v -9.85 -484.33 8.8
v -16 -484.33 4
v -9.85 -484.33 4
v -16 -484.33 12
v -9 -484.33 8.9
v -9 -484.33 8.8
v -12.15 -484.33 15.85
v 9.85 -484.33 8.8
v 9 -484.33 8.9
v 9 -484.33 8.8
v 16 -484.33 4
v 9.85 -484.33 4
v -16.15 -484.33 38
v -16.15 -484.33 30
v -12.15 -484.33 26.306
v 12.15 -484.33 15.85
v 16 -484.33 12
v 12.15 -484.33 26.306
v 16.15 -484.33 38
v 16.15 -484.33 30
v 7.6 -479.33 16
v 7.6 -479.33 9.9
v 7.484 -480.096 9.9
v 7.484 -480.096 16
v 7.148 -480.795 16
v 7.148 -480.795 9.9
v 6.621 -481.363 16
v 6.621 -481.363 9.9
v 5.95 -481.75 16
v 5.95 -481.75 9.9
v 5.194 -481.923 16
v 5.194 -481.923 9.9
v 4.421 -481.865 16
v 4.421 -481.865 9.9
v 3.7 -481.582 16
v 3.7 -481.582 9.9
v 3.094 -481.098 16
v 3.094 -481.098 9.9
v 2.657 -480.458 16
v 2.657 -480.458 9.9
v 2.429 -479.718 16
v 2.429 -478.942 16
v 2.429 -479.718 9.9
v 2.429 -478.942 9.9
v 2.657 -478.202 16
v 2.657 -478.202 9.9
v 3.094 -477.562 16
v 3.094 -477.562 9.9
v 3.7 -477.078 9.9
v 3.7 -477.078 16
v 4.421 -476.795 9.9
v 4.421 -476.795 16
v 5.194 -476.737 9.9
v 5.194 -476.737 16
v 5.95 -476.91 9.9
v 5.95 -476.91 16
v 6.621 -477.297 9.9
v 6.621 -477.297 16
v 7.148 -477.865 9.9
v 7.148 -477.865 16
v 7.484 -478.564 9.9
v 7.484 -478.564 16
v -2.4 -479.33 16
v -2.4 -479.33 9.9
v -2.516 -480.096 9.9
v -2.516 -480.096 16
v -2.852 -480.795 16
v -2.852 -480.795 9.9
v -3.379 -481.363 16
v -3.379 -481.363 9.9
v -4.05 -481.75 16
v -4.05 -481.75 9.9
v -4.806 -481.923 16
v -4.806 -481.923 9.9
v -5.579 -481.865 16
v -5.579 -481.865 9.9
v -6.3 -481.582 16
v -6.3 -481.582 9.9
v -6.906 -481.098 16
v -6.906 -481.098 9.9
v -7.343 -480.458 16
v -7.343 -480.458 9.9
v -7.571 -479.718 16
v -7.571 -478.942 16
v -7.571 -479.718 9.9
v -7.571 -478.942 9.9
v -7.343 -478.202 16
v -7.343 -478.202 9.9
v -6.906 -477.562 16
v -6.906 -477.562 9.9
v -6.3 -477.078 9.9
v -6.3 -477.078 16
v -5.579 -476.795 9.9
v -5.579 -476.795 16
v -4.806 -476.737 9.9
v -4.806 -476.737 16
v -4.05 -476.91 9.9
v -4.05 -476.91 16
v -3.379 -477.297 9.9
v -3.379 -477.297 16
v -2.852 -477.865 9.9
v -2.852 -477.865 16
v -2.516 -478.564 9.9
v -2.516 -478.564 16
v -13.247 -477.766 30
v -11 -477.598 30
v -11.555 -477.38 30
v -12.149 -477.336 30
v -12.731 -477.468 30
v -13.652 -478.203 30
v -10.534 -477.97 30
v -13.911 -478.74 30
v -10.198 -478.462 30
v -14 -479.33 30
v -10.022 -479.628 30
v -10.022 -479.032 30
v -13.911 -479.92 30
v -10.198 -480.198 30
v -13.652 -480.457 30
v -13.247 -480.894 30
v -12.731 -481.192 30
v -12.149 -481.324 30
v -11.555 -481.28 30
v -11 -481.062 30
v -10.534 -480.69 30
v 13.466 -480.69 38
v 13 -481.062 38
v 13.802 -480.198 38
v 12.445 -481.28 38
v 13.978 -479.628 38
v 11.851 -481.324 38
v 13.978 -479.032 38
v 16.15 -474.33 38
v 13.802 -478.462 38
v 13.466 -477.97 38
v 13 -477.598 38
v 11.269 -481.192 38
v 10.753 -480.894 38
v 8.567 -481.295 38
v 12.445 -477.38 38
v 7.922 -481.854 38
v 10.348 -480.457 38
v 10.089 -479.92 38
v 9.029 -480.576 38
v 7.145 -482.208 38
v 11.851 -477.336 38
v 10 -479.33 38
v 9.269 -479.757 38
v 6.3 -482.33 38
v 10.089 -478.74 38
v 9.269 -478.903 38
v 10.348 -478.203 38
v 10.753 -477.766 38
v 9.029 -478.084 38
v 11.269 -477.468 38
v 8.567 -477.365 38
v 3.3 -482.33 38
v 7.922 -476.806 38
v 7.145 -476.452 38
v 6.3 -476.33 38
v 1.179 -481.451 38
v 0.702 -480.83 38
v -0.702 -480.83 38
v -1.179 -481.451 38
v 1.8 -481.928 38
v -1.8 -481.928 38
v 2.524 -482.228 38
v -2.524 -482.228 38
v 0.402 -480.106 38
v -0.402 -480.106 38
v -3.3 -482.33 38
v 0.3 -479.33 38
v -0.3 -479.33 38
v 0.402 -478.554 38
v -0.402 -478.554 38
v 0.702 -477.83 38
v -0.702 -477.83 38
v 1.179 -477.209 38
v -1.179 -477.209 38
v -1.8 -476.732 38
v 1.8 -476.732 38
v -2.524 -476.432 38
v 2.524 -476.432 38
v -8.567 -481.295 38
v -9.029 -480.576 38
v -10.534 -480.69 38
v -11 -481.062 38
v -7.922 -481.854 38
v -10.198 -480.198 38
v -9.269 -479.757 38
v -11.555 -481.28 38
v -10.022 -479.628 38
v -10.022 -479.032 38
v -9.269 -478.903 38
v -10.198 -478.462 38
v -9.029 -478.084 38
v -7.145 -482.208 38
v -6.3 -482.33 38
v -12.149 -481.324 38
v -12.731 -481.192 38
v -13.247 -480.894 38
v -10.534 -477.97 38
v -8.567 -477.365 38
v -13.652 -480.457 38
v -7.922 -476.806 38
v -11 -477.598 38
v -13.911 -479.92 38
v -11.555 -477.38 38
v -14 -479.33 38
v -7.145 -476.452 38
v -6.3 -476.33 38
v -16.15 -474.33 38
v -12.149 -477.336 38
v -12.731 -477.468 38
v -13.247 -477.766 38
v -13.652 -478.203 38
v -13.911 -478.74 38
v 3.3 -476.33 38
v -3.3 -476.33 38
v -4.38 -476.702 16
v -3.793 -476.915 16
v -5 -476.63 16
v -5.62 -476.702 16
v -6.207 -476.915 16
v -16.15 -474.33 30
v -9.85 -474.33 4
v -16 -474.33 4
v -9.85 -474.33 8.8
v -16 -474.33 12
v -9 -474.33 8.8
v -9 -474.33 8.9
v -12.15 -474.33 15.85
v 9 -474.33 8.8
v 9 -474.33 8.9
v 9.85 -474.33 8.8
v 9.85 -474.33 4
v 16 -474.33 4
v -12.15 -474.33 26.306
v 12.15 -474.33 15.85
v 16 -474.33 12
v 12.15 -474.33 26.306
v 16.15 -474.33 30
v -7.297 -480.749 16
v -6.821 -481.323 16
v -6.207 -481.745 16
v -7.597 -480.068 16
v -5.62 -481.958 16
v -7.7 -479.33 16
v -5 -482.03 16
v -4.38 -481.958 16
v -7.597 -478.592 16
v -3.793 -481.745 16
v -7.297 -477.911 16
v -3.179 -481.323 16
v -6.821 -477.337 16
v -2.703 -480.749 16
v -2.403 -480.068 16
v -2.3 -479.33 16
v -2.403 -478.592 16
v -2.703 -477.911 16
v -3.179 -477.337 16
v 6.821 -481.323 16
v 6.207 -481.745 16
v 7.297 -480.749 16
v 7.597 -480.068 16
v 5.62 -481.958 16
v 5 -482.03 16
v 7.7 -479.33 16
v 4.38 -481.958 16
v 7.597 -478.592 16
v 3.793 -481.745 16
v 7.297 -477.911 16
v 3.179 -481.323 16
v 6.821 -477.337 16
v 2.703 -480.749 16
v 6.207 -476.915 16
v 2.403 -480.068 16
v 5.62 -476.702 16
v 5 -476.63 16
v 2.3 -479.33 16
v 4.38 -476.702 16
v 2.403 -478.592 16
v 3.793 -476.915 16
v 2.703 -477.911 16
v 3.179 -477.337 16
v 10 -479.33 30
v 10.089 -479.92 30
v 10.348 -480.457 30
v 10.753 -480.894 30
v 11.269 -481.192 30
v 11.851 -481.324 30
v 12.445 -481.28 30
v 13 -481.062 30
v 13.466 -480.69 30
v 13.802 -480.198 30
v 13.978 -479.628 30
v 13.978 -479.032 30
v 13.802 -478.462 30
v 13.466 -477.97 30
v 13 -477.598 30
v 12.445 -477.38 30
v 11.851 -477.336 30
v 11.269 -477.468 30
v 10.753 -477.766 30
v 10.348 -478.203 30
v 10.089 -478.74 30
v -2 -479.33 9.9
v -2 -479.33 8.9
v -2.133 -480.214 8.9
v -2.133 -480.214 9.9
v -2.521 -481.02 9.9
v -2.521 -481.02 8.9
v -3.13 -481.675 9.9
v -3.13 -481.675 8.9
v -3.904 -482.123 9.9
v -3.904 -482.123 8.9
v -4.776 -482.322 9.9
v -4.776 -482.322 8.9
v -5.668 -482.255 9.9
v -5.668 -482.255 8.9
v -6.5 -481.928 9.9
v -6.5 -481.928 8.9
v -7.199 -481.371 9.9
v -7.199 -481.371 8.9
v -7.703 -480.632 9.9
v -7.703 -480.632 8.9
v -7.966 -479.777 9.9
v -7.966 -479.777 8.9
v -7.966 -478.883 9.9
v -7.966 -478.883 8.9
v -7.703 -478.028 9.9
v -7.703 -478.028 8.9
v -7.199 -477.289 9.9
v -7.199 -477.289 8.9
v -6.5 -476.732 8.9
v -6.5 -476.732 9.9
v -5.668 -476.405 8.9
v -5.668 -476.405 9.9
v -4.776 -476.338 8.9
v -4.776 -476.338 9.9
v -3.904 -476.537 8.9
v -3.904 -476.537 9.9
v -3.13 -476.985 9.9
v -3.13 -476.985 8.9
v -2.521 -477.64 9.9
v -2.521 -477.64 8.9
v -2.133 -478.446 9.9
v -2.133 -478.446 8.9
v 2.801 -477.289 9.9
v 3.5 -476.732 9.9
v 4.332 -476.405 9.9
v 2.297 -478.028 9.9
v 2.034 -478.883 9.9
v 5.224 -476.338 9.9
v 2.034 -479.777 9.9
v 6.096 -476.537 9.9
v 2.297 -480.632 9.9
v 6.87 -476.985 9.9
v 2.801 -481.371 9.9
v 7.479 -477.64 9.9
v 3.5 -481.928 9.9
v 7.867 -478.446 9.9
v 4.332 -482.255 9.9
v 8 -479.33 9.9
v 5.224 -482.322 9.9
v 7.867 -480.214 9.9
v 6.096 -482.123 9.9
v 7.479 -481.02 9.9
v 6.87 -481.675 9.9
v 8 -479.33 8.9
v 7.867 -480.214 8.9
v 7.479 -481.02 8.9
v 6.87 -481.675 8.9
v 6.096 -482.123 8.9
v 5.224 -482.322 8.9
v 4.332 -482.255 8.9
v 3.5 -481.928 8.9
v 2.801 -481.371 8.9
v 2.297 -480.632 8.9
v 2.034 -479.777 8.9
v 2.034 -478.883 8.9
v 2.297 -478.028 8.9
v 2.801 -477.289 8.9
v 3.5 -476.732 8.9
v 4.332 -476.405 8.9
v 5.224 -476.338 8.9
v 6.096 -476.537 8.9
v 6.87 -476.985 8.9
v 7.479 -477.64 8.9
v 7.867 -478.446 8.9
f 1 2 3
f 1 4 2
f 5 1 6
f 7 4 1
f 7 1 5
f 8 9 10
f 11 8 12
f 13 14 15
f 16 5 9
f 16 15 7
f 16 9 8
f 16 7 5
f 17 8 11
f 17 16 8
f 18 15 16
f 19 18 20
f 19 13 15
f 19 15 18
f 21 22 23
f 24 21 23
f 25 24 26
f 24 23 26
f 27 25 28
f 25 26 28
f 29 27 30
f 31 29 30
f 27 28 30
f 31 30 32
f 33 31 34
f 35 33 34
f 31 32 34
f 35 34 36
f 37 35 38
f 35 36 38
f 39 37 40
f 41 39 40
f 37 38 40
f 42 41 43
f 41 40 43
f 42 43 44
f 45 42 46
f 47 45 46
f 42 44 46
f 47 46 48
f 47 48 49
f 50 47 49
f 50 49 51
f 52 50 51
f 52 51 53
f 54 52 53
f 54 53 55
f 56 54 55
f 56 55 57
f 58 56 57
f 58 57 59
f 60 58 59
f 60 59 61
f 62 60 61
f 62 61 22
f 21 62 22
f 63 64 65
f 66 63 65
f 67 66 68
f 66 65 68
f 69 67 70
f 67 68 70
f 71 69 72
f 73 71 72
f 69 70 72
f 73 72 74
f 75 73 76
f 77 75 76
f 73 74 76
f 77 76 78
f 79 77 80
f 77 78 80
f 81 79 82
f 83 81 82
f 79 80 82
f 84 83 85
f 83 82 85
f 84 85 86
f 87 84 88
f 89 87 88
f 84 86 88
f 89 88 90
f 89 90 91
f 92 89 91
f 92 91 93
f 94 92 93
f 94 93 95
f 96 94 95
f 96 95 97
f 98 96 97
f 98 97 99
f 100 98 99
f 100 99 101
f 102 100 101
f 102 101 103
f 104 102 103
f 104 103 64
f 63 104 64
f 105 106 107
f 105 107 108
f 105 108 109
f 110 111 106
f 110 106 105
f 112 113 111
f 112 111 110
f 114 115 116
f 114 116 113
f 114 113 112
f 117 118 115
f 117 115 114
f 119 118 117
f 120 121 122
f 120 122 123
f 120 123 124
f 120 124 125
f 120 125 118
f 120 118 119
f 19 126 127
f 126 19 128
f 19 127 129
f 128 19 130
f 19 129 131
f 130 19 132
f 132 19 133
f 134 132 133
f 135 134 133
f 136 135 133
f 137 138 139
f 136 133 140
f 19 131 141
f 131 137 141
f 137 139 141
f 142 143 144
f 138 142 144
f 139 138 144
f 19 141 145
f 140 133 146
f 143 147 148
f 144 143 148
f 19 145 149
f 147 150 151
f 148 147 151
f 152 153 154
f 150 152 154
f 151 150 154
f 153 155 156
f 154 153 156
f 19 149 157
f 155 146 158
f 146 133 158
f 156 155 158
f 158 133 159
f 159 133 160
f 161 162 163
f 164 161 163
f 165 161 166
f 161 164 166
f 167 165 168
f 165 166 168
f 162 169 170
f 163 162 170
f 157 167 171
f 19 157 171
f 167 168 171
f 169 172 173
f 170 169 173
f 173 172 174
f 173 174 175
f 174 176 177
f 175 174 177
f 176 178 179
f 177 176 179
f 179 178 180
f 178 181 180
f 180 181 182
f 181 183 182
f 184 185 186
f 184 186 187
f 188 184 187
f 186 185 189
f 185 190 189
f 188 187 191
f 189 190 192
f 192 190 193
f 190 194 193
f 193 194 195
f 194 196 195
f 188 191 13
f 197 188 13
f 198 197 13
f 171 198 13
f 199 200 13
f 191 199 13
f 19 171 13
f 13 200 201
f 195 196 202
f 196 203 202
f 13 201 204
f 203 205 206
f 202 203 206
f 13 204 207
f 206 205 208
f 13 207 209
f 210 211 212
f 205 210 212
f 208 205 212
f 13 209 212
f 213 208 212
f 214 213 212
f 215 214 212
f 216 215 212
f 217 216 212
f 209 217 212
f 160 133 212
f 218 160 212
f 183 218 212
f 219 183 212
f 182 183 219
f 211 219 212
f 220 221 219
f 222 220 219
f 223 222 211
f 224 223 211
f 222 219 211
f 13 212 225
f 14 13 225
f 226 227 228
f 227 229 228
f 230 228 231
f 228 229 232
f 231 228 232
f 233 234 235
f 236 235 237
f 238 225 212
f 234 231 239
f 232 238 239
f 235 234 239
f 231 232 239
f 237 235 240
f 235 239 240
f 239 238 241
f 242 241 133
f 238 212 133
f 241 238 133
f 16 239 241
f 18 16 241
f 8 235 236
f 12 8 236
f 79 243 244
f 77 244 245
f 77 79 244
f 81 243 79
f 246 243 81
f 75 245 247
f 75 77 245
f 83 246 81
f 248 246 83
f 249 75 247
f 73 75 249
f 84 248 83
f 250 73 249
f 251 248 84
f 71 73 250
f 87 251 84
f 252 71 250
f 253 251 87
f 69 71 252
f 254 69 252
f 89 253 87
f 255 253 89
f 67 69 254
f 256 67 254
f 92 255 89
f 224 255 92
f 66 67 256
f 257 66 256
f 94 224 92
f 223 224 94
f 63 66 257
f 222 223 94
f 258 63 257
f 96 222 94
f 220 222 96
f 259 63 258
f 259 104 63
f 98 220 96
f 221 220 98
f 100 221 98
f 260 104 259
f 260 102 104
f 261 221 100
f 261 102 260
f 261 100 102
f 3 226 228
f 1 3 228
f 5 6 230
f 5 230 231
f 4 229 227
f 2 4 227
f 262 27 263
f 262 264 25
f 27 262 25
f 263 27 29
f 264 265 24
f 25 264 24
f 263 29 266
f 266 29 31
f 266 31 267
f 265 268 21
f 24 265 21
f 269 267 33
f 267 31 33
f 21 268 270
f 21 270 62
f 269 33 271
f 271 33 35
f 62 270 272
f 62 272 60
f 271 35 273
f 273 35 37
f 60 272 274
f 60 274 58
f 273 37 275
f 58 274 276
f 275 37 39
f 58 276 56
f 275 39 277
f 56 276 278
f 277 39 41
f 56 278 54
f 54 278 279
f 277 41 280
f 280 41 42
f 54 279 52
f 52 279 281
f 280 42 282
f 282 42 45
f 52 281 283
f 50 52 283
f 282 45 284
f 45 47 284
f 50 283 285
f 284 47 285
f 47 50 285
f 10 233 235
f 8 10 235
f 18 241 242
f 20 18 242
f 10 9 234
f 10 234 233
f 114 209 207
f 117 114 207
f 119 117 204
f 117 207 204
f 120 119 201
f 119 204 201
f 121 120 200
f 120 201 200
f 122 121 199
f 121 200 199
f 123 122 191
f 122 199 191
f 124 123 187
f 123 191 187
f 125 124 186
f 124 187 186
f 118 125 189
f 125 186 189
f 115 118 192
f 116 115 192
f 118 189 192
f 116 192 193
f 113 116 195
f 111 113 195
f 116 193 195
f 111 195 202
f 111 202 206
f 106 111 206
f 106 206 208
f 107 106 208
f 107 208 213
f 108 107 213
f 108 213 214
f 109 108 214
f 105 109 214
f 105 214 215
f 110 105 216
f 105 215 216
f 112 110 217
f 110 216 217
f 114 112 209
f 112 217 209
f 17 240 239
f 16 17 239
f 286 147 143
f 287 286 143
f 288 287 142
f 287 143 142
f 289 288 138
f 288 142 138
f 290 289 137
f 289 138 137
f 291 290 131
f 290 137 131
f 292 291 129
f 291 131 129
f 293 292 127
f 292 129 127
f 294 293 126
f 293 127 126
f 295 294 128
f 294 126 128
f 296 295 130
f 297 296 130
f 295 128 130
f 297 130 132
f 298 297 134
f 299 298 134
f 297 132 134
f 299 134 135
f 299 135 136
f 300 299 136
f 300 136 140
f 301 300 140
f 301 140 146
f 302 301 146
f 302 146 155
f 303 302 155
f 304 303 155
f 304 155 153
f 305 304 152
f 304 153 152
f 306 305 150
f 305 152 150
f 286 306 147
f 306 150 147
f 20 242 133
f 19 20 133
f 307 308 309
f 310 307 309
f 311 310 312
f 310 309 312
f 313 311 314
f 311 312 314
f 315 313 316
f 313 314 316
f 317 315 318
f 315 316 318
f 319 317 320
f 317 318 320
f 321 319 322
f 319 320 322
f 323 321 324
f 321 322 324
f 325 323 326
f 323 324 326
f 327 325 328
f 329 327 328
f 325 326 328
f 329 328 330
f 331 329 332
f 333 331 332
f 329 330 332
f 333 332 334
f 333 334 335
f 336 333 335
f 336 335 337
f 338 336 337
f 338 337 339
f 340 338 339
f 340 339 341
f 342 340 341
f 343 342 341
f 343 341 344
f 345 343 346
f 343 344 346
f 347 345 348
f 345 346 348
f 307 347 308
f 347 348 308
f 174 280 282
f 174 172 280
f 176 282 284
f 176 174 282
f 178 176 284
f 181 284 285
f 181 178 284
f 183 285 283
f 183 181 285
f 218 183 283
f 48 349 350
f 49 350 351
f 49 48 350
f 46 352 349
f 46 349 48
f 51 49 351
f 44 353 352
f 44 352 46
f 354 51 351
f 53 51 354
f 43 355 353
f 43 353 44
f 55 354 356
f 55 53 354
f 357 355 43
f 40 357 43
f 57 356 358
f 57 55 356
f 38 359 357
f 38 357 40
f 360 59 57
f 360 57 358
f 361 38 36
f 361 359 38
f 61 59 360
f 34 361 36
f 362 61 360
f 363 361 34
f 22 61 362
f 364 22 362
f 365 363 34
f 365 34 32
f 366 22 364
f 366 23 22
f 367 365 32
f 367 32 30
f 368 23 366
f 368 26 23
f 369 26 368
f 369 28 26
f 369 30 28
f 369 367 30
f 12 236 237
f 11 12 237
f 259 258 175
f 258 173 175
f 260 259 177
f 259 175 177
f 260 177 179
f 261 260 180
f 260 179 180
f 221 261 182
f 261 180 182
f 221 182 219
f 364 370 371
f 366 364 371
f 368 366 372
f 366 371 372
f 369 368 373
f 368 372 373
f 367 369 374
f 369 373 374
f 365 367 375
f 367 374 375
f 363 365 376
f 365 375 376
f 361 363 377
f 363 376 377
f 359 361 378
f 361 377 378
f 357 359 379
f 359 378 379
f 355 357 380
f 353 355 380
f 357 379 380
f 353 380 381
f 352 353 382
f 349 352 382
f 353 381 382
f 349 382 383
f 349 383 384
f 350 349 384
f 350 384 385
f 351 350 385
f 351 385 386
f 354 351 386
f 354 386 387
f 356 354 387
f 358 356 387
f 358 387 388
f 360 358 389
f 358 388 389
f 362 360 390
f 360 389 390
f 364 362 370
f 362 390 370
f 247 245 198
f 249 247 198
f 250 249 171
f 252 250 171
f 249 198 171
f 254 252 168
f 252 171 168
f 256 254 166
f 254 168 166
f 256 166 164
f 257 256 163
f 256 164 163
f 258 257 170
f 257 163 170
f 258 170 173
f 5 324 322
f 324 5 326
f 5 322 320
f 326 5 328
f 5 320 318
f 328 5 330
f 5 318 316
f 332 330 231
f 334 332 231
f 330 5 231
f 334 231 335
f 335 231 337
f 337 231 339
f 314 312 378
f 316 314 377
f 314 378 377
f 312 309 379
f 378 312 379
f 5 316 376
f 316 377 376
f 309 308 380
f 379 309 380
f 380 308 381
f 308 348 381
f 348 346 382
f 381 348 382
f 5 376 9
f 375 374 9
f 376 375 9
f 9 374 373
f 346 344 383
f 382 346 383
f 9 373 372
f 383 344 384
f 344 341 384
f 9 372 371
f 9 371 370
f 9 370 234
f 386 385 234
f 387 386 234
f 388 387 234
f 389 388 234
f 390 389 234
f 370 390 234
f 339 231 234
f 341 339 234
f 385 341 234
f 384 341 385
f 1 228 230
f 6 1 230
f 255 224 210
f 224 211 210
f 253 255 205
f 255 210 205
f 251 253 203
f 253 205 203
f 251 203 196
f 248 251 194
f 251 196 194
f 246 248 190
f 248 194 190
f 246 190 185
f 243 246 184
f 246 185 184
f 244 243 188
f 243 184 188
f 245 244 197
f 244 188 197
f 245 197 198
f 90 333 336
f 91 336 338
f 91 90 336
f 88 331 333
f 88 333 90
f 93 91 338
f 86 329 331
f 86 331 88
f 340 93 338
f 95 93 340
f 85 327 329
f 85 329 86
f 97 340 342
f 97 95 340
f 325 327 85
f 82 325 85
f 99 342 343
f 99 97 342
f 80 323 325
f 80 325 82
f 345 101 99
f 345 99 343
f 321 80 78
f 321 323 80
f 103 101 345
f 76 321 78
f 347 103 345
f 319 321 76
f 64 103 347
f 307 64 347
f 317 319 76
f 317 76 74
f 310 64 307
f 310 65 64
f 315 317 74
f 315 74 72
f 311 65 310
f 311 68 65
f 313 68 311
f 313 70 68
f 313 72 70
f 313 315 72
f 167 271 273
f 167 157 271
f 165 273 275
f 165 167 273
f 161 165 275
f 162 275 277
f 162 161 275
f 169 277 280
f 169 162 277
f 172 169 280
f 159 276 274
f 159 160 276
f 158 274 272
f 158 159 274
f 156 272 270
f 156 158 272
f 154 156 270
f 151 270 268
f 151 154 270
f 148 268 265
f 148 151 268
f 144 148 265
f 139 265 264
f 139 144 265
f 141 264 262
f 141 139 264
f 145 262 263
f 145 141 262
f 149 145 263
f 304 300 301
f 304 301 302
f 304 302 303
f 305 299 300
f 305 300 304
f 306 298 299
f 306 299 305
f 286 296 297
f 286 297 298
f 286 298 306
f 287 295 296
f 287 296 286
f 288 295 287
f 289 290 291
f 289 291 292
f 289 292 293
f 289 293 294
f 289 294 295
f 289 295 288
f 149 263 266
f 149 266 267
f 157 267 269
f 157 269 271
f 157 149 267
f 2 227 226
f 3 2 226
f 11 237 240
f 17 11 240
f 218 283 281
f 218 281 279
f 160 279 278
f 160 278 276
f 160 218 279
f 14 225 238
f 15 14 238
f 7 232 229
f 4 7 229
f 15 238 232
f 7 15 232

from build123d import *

# Parameters (mm, degrees)
SKETCH079_R     = 2.7
PAD033_DEPTH    = 10
SKETCH076_R     = 2.6
POCKET031_DEPTH = 8
SKETCH077_R     = 3
POCKET032_DEPTH = 1
SKETCH080_R     = 2
POCKET033_DEPTH = 8


with BuildPart() as loft005:
    # Sketch079 → Loft005 section 0
    with BuildSketch(Plane.XY.offset(16)):
        with Locations((-5, 0)):
            Circle(SKETCH079_R)
    # Sketch078 → Loft005 section 1
    with BuildSketch(Plane.XY.offset(38)):
        with BuildLine():
            ThreePointArc((-6.3, 3), (-9.3, 0), (-6.3, -3))
            Line((-6.3, -3), (-3.3, -3))
            ThreePointArc((-3.3, -3), (-0.3, 0), (-3.3, 3))
            Line((-3.3, 3), (-6.3, 3))
        make_face()
    loft()


with BuildPart() as part_mirroring005:
    # Part__Mirroring005: instance of Loft005
    add(loft005.part.mirror(Plane(origin=(0, 0, 0), x_dir=(0, -1, 0), z_dir=(1, 0, 0))))


with BuildPart() as fusion005:
    # Fusion005 base: copy of Loft005
    add(loft005.part)

    # Fusion005: union Part__Mirroring005
    add(part_mirroring005.part)


with BuildPart() as fusion005_1:
    # Fusion005 placement: moved
    add(fusion005.part.moved(Location((0, -5, 0))))


with BuildPart() as cut004:
    # Sketch075 → Pad033 (new body)
    with BuildSketch(Plane.XZ):
        Polygon((-16, 4), (-9.85, 4), (-9.85, 7.2), (-9.85, 8.8), (-9, 8.8), (-9, 8.9), (9, 8.9), (9, 8.8), (9.85, 8.8), (9.85, 7.2), (9.85, 4), (16, 4), (16, 12), (12.15, 15.85), (12.15, 26.306086), (16.15, 30), (16.15, 38), (-16.15, 38), (-16.15, 30), (-12.15, 26.306086), (-12.15, 15.85), (-16, 12), align=None)
    extrude(amount=PAD033_DEPTH)

    # Sketch076 (on Face7 of Pad033) → Pocket031 (cut)
    with BuildSketch(Plane(origin=(0, 0, 8.9), x_dir=(1, 0, 0), z_dir=(0, 0, -1))):
        with Locations((-5, 5)):
            Circle(SKETCH076_R)
        with Locations((5, 5)):
            Circle(SKETCH076_R)
    extrude(amount=-POCKET031_DEPTH, mode=Mode.SUBTRACT)

    # Sketch077 (on Face11 of Pocket031) → Pocket032 (cut)
    with BuildSketch(Plane(origin=(0, 0, 8.9), x_dir=(1, 0, 0), z_dir=(0, 0, -1))):
        with Locations((-5, 5)):
            Circle(SKETCH077_R)
        with Locations((5, 5)):
            Circle(SKETCH077_R)
    extrude(amount=-POCKET032_DEPTH, mode=Mode.SUBTRACT)

    # Sketch080 (on Face22 of Pocket032) → Pocket033 (cut)
    with BuildSketch(Plane(origin=(0, 0, 38), x_dir=(-1, 0, 0), z_dir=(0, 0, 1))):
        with Locations((-12, 5)):
            Circle(SKETCH080_R)
        with Locations((12, 5)):
            Circle(SKETCH080_R)
    extrude(amount=-POCKET033_DEPTH, mode=Mode.SUBTRACT)

    # Cut004: cut Fusion005
    add(fusion005_1.part, mode=Mode.SUBTRACT)


with BuildPart() as cut004_1:
    # Cut004 placement: moved
    add(cut004.part.moved(Location((0, -474.33, 0))))


solid = cut004_1.part
